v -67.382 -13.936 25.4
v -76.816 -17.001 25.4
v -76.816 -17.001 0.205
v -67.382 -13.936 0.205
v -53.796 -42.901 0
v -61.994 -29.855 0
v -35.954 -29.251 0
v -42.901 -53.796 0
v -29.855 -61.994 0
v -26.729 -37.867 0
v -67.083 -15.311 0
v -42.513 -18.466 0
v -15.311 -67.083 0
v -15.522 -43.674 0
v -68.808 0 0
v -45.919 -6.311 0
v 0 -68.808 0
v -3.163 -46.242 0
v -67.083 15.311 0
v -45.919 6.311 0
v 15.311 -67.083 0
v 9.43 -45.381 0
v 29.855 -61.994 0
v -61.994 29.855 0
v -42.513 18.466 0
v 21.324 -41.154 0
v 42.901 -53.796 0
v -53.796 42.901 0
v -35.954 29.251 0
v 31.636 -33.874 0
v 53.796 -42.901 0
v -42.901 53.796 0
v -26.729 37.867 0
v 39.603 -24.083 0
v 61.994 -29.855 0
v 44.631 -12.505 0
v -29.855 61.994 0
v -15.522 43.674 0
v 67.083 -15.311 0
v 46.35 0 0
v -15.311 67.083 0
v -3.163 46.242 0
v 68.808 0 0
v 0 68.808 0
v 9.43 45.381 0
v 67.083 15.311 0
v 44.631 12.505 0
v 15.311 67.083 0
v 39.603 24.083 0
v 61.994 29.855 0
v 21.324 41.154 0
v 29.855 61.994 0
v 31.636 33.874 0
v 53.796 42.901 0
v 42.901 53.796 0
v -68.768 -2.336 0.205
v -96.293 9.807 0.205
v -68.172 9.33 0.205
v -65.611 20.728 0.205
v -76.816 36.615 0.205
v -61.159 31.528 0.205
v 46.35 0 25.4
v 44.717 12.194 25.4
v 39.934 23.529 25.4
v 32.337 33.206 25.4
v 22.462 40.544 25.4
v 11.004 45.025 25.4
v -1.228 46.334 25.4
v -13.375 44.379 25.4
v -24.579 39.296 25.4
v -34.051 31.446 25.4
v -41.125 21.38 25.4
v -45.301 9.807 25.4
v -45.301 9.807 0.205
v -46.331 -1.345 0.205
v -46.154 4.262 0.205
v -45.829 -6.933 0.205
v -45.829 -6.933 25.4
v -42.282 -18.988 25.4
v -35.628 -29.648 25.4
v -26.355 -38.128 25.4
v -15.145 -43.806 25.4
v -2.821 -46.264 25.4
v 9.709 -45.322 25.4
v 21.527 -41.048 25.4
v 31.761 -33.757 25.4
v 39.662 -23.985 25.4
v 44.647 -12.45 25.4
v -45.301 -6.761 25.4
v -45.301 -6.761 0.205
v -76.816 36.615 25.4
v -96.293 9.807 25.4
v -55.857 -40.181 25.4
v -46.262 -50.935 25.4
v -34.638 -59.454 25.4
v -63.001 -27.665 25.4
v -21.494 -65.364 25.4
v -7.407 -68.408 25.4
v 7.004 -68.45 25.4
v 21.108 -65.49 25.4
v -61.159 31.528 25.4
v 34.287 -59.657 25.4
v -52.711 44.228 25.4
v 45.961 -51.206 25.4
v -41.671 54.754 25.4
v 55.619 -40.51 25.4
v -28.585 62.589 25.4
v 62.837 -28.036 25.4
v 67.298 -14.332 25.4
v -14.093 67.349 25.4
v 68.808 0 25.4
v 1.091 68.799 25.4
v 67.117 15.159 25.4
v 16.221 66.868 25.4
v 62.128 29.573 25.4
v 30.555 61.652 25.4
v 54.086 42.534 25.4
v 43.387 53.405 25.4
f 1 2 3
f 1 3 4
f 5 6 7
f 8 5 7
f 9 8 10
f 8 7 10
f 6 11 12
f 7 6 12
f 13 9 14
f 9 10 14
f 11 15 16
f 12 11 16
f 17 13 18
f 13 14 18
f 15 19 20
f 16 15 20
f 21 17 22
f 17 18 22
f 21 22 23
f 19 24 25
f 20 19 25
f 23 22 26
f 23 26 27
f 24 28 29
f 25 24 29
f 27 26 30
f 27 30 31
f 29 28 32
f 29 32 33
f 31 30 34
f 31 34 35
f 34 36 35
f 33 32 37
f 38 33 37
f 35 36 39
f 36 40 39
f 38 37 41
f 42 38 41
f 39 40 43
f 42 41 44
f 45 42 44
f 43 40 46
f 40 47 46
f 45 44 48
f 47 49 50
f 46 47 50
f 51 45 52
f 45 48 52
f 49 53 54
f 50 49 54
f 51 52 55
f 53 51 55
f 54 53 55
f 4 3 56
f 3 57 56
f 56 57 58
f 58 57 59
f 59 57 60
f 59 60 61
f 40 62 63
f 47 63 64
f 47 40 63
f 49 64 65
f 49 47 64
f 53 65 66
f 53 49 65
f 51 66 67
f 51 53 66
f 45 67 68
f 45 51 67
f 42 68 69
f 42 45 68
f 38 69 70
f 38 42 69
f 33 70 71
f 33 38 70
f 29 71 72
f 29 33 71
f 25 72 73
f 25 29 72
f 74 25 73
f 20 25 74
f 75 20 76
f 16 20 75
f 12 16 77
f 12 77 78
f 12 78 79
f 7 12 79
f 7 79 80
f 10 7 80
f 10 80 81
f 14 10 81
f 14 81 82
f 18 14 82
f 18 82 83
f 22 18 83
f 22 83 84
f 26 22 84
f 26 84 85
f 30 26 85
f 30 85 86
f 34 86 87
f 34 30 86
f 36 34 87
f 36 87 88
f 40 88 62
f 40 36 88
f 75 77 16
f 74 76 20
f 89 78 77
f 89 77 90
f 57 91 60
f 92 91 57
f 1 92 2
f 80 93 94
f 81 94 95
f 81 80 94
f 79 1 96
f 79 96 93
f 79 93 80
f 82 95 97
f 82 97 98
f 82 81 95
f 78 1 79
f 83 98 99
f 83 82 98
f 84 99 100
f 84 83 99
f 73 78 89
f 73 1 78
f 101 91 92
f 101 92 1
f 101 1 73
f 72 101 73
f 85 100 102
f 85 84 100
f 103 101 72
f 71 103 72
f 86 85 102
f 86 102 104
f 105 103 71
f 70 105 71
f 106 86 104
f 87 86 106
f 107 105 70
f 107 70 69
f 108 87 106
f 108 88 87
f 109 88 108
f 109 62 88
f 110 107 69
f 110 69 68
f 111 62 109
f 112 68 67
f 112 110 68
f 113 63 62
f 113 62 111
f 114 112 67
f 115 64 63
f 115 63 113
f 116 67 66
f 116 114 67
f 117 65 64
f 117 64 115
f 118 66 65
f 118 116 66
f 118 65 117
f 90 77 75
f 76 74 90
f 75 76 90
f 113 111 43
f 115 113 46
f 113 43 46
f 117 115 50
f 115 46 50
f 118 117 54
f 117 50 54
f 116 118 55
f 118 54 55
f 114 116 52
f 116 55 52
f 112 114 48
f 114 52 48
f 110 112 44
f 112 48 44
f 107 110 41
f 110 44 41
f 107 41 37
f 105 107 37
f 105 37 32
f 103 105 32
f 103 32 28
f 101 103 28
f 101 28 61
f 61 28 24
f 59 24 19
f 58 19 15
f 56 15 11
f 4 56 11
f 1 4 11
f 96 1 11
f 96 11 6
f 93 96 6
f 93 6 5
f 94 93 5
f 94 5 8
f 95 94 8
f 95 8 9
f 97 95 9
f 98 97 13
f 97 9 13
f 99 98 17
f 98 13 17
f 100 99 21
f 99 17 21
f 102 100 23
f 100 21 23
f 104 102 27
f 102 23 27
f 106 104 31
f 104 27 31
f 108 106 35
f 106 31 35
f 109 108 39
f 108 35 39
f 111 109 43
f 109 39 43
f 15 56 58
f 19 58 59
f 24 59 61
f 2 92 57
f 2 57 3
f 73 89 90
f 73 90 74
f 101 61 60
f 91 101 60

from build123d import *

# Parameters (mm, degrees)
F3_R     = 68.807709
F3_R_2   = 46.350216
F1_DEPTH = 25.4
F4_DEPTH = 25.194961


with BuildPart() as f1:
    # F3 (on face) → F1 (new body)
    with BuildSketch(Plane.XY):
        Circle(F3_R)
        Circle(F3_R_2, mode=Mode.SUBTRACT)
    extrude(amount=F1_DEPTH)

    # F2 (on face) → F4 (join)
    with BuildSketch(Plane.XY.offset(25.4)):
        Polygon((-45.300776, -6.761135), (-45.300776, 26.375637), (-76.815719, 36.615463), (-96.293024, 9.807251), (-76.815719, -17.00096), align=None)
    extrude(amount=-F4_DEPTH)


solid = f1.part
